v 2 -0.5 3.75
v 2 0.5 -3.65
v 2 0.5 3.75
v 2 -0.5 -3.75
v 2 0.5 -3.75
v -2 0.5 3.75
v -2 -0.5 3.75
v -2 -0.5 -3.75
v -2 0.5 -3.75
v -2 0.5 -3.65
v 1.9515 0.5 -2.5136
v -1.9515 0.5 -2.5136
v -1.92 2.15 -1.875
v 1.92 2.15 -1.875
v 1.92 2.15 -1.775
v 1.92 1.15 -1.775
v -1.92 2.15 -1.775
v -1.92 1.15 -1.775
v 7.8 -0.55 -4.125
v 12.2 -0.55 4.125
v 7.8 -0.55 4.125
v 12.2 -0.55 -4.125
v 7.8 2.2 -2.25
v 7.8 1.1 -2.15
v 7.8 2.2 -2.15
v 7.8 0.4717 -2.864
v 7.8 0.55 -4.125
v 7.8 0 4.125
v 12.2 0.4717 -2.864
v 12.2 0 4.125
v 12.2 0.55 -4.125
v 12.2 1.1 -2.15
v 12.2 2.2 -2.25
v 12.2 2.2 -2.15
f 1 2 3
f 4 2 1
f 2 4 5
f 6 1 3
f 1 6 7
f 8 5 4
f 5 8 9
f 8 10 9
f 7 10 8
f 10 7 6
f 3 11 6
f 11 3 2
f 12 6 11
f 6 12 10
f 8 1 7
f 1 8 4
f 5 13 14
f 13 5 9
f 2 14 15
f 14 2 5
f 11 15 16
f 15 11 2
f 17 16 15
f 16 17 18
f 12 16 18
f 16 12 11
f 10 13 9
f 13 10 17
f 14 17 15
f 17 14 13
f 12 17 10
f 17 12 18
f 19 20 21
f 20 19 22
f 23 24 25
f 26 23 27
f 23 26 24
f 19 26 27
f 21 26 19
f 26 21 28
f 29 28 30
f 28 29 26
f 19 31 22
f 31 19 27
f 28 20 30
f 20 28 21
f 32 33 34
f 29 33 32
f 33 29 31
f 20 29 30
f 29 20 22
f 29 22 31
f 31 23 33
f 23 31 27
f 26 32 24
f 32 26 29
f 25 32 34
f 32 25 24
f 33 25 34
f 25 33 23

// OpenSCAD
//Width
//Thickness
//Length
properties = [4, 1, 7.5];

//clip(properties, false);
module clip(properties, positive){
    scalingFactor = 1.1;
    dimensions = [properties[0], properties[1], properties[2]];
    dimensionsNegative = dimensions * scalingFactor;
    if(positive){
        translate(-dimensions / 2){
            cube(dimensions);
            hull(){
                cube([dimensions.x, dimensions.y, 0.1]);
                translate([dimensions.x * 0.04 / 2, properties[1] * 1.5 * scalingFactor, properties[2] / 4]){
                    cube([dimensions.x * 0.96, dimensions.y, 0.1]);
                }
            }
        }
    }else{
        translate(-dimensionsNegative / 2){
            hull(){
                translate([0, 0, dimensionsNegative.z - 0.1]){
                    cube([dimensionsNegative.x, dimensionsNegative.y / 2, 0.1]);    
                }
                cube([dimensionsNegative.x, dimensionsNegative.y, 0.1]);
            }
            //cube(dimensionsNegative);
            hull(){
                cube([dimensionsNegative.x, dimensionsNegative.y, 0.1]);
                translate([0, properties[1] * 1.5 * scalingFactor, properties[2] / 4]){
                    cube([dimensionsNegative.x, dimensionsNegative.y, 0.1]);
                }
            }
        }
    }
}

clip(properties, true);
translate([10, 0, 0]){
    clip(properties, false);
}
